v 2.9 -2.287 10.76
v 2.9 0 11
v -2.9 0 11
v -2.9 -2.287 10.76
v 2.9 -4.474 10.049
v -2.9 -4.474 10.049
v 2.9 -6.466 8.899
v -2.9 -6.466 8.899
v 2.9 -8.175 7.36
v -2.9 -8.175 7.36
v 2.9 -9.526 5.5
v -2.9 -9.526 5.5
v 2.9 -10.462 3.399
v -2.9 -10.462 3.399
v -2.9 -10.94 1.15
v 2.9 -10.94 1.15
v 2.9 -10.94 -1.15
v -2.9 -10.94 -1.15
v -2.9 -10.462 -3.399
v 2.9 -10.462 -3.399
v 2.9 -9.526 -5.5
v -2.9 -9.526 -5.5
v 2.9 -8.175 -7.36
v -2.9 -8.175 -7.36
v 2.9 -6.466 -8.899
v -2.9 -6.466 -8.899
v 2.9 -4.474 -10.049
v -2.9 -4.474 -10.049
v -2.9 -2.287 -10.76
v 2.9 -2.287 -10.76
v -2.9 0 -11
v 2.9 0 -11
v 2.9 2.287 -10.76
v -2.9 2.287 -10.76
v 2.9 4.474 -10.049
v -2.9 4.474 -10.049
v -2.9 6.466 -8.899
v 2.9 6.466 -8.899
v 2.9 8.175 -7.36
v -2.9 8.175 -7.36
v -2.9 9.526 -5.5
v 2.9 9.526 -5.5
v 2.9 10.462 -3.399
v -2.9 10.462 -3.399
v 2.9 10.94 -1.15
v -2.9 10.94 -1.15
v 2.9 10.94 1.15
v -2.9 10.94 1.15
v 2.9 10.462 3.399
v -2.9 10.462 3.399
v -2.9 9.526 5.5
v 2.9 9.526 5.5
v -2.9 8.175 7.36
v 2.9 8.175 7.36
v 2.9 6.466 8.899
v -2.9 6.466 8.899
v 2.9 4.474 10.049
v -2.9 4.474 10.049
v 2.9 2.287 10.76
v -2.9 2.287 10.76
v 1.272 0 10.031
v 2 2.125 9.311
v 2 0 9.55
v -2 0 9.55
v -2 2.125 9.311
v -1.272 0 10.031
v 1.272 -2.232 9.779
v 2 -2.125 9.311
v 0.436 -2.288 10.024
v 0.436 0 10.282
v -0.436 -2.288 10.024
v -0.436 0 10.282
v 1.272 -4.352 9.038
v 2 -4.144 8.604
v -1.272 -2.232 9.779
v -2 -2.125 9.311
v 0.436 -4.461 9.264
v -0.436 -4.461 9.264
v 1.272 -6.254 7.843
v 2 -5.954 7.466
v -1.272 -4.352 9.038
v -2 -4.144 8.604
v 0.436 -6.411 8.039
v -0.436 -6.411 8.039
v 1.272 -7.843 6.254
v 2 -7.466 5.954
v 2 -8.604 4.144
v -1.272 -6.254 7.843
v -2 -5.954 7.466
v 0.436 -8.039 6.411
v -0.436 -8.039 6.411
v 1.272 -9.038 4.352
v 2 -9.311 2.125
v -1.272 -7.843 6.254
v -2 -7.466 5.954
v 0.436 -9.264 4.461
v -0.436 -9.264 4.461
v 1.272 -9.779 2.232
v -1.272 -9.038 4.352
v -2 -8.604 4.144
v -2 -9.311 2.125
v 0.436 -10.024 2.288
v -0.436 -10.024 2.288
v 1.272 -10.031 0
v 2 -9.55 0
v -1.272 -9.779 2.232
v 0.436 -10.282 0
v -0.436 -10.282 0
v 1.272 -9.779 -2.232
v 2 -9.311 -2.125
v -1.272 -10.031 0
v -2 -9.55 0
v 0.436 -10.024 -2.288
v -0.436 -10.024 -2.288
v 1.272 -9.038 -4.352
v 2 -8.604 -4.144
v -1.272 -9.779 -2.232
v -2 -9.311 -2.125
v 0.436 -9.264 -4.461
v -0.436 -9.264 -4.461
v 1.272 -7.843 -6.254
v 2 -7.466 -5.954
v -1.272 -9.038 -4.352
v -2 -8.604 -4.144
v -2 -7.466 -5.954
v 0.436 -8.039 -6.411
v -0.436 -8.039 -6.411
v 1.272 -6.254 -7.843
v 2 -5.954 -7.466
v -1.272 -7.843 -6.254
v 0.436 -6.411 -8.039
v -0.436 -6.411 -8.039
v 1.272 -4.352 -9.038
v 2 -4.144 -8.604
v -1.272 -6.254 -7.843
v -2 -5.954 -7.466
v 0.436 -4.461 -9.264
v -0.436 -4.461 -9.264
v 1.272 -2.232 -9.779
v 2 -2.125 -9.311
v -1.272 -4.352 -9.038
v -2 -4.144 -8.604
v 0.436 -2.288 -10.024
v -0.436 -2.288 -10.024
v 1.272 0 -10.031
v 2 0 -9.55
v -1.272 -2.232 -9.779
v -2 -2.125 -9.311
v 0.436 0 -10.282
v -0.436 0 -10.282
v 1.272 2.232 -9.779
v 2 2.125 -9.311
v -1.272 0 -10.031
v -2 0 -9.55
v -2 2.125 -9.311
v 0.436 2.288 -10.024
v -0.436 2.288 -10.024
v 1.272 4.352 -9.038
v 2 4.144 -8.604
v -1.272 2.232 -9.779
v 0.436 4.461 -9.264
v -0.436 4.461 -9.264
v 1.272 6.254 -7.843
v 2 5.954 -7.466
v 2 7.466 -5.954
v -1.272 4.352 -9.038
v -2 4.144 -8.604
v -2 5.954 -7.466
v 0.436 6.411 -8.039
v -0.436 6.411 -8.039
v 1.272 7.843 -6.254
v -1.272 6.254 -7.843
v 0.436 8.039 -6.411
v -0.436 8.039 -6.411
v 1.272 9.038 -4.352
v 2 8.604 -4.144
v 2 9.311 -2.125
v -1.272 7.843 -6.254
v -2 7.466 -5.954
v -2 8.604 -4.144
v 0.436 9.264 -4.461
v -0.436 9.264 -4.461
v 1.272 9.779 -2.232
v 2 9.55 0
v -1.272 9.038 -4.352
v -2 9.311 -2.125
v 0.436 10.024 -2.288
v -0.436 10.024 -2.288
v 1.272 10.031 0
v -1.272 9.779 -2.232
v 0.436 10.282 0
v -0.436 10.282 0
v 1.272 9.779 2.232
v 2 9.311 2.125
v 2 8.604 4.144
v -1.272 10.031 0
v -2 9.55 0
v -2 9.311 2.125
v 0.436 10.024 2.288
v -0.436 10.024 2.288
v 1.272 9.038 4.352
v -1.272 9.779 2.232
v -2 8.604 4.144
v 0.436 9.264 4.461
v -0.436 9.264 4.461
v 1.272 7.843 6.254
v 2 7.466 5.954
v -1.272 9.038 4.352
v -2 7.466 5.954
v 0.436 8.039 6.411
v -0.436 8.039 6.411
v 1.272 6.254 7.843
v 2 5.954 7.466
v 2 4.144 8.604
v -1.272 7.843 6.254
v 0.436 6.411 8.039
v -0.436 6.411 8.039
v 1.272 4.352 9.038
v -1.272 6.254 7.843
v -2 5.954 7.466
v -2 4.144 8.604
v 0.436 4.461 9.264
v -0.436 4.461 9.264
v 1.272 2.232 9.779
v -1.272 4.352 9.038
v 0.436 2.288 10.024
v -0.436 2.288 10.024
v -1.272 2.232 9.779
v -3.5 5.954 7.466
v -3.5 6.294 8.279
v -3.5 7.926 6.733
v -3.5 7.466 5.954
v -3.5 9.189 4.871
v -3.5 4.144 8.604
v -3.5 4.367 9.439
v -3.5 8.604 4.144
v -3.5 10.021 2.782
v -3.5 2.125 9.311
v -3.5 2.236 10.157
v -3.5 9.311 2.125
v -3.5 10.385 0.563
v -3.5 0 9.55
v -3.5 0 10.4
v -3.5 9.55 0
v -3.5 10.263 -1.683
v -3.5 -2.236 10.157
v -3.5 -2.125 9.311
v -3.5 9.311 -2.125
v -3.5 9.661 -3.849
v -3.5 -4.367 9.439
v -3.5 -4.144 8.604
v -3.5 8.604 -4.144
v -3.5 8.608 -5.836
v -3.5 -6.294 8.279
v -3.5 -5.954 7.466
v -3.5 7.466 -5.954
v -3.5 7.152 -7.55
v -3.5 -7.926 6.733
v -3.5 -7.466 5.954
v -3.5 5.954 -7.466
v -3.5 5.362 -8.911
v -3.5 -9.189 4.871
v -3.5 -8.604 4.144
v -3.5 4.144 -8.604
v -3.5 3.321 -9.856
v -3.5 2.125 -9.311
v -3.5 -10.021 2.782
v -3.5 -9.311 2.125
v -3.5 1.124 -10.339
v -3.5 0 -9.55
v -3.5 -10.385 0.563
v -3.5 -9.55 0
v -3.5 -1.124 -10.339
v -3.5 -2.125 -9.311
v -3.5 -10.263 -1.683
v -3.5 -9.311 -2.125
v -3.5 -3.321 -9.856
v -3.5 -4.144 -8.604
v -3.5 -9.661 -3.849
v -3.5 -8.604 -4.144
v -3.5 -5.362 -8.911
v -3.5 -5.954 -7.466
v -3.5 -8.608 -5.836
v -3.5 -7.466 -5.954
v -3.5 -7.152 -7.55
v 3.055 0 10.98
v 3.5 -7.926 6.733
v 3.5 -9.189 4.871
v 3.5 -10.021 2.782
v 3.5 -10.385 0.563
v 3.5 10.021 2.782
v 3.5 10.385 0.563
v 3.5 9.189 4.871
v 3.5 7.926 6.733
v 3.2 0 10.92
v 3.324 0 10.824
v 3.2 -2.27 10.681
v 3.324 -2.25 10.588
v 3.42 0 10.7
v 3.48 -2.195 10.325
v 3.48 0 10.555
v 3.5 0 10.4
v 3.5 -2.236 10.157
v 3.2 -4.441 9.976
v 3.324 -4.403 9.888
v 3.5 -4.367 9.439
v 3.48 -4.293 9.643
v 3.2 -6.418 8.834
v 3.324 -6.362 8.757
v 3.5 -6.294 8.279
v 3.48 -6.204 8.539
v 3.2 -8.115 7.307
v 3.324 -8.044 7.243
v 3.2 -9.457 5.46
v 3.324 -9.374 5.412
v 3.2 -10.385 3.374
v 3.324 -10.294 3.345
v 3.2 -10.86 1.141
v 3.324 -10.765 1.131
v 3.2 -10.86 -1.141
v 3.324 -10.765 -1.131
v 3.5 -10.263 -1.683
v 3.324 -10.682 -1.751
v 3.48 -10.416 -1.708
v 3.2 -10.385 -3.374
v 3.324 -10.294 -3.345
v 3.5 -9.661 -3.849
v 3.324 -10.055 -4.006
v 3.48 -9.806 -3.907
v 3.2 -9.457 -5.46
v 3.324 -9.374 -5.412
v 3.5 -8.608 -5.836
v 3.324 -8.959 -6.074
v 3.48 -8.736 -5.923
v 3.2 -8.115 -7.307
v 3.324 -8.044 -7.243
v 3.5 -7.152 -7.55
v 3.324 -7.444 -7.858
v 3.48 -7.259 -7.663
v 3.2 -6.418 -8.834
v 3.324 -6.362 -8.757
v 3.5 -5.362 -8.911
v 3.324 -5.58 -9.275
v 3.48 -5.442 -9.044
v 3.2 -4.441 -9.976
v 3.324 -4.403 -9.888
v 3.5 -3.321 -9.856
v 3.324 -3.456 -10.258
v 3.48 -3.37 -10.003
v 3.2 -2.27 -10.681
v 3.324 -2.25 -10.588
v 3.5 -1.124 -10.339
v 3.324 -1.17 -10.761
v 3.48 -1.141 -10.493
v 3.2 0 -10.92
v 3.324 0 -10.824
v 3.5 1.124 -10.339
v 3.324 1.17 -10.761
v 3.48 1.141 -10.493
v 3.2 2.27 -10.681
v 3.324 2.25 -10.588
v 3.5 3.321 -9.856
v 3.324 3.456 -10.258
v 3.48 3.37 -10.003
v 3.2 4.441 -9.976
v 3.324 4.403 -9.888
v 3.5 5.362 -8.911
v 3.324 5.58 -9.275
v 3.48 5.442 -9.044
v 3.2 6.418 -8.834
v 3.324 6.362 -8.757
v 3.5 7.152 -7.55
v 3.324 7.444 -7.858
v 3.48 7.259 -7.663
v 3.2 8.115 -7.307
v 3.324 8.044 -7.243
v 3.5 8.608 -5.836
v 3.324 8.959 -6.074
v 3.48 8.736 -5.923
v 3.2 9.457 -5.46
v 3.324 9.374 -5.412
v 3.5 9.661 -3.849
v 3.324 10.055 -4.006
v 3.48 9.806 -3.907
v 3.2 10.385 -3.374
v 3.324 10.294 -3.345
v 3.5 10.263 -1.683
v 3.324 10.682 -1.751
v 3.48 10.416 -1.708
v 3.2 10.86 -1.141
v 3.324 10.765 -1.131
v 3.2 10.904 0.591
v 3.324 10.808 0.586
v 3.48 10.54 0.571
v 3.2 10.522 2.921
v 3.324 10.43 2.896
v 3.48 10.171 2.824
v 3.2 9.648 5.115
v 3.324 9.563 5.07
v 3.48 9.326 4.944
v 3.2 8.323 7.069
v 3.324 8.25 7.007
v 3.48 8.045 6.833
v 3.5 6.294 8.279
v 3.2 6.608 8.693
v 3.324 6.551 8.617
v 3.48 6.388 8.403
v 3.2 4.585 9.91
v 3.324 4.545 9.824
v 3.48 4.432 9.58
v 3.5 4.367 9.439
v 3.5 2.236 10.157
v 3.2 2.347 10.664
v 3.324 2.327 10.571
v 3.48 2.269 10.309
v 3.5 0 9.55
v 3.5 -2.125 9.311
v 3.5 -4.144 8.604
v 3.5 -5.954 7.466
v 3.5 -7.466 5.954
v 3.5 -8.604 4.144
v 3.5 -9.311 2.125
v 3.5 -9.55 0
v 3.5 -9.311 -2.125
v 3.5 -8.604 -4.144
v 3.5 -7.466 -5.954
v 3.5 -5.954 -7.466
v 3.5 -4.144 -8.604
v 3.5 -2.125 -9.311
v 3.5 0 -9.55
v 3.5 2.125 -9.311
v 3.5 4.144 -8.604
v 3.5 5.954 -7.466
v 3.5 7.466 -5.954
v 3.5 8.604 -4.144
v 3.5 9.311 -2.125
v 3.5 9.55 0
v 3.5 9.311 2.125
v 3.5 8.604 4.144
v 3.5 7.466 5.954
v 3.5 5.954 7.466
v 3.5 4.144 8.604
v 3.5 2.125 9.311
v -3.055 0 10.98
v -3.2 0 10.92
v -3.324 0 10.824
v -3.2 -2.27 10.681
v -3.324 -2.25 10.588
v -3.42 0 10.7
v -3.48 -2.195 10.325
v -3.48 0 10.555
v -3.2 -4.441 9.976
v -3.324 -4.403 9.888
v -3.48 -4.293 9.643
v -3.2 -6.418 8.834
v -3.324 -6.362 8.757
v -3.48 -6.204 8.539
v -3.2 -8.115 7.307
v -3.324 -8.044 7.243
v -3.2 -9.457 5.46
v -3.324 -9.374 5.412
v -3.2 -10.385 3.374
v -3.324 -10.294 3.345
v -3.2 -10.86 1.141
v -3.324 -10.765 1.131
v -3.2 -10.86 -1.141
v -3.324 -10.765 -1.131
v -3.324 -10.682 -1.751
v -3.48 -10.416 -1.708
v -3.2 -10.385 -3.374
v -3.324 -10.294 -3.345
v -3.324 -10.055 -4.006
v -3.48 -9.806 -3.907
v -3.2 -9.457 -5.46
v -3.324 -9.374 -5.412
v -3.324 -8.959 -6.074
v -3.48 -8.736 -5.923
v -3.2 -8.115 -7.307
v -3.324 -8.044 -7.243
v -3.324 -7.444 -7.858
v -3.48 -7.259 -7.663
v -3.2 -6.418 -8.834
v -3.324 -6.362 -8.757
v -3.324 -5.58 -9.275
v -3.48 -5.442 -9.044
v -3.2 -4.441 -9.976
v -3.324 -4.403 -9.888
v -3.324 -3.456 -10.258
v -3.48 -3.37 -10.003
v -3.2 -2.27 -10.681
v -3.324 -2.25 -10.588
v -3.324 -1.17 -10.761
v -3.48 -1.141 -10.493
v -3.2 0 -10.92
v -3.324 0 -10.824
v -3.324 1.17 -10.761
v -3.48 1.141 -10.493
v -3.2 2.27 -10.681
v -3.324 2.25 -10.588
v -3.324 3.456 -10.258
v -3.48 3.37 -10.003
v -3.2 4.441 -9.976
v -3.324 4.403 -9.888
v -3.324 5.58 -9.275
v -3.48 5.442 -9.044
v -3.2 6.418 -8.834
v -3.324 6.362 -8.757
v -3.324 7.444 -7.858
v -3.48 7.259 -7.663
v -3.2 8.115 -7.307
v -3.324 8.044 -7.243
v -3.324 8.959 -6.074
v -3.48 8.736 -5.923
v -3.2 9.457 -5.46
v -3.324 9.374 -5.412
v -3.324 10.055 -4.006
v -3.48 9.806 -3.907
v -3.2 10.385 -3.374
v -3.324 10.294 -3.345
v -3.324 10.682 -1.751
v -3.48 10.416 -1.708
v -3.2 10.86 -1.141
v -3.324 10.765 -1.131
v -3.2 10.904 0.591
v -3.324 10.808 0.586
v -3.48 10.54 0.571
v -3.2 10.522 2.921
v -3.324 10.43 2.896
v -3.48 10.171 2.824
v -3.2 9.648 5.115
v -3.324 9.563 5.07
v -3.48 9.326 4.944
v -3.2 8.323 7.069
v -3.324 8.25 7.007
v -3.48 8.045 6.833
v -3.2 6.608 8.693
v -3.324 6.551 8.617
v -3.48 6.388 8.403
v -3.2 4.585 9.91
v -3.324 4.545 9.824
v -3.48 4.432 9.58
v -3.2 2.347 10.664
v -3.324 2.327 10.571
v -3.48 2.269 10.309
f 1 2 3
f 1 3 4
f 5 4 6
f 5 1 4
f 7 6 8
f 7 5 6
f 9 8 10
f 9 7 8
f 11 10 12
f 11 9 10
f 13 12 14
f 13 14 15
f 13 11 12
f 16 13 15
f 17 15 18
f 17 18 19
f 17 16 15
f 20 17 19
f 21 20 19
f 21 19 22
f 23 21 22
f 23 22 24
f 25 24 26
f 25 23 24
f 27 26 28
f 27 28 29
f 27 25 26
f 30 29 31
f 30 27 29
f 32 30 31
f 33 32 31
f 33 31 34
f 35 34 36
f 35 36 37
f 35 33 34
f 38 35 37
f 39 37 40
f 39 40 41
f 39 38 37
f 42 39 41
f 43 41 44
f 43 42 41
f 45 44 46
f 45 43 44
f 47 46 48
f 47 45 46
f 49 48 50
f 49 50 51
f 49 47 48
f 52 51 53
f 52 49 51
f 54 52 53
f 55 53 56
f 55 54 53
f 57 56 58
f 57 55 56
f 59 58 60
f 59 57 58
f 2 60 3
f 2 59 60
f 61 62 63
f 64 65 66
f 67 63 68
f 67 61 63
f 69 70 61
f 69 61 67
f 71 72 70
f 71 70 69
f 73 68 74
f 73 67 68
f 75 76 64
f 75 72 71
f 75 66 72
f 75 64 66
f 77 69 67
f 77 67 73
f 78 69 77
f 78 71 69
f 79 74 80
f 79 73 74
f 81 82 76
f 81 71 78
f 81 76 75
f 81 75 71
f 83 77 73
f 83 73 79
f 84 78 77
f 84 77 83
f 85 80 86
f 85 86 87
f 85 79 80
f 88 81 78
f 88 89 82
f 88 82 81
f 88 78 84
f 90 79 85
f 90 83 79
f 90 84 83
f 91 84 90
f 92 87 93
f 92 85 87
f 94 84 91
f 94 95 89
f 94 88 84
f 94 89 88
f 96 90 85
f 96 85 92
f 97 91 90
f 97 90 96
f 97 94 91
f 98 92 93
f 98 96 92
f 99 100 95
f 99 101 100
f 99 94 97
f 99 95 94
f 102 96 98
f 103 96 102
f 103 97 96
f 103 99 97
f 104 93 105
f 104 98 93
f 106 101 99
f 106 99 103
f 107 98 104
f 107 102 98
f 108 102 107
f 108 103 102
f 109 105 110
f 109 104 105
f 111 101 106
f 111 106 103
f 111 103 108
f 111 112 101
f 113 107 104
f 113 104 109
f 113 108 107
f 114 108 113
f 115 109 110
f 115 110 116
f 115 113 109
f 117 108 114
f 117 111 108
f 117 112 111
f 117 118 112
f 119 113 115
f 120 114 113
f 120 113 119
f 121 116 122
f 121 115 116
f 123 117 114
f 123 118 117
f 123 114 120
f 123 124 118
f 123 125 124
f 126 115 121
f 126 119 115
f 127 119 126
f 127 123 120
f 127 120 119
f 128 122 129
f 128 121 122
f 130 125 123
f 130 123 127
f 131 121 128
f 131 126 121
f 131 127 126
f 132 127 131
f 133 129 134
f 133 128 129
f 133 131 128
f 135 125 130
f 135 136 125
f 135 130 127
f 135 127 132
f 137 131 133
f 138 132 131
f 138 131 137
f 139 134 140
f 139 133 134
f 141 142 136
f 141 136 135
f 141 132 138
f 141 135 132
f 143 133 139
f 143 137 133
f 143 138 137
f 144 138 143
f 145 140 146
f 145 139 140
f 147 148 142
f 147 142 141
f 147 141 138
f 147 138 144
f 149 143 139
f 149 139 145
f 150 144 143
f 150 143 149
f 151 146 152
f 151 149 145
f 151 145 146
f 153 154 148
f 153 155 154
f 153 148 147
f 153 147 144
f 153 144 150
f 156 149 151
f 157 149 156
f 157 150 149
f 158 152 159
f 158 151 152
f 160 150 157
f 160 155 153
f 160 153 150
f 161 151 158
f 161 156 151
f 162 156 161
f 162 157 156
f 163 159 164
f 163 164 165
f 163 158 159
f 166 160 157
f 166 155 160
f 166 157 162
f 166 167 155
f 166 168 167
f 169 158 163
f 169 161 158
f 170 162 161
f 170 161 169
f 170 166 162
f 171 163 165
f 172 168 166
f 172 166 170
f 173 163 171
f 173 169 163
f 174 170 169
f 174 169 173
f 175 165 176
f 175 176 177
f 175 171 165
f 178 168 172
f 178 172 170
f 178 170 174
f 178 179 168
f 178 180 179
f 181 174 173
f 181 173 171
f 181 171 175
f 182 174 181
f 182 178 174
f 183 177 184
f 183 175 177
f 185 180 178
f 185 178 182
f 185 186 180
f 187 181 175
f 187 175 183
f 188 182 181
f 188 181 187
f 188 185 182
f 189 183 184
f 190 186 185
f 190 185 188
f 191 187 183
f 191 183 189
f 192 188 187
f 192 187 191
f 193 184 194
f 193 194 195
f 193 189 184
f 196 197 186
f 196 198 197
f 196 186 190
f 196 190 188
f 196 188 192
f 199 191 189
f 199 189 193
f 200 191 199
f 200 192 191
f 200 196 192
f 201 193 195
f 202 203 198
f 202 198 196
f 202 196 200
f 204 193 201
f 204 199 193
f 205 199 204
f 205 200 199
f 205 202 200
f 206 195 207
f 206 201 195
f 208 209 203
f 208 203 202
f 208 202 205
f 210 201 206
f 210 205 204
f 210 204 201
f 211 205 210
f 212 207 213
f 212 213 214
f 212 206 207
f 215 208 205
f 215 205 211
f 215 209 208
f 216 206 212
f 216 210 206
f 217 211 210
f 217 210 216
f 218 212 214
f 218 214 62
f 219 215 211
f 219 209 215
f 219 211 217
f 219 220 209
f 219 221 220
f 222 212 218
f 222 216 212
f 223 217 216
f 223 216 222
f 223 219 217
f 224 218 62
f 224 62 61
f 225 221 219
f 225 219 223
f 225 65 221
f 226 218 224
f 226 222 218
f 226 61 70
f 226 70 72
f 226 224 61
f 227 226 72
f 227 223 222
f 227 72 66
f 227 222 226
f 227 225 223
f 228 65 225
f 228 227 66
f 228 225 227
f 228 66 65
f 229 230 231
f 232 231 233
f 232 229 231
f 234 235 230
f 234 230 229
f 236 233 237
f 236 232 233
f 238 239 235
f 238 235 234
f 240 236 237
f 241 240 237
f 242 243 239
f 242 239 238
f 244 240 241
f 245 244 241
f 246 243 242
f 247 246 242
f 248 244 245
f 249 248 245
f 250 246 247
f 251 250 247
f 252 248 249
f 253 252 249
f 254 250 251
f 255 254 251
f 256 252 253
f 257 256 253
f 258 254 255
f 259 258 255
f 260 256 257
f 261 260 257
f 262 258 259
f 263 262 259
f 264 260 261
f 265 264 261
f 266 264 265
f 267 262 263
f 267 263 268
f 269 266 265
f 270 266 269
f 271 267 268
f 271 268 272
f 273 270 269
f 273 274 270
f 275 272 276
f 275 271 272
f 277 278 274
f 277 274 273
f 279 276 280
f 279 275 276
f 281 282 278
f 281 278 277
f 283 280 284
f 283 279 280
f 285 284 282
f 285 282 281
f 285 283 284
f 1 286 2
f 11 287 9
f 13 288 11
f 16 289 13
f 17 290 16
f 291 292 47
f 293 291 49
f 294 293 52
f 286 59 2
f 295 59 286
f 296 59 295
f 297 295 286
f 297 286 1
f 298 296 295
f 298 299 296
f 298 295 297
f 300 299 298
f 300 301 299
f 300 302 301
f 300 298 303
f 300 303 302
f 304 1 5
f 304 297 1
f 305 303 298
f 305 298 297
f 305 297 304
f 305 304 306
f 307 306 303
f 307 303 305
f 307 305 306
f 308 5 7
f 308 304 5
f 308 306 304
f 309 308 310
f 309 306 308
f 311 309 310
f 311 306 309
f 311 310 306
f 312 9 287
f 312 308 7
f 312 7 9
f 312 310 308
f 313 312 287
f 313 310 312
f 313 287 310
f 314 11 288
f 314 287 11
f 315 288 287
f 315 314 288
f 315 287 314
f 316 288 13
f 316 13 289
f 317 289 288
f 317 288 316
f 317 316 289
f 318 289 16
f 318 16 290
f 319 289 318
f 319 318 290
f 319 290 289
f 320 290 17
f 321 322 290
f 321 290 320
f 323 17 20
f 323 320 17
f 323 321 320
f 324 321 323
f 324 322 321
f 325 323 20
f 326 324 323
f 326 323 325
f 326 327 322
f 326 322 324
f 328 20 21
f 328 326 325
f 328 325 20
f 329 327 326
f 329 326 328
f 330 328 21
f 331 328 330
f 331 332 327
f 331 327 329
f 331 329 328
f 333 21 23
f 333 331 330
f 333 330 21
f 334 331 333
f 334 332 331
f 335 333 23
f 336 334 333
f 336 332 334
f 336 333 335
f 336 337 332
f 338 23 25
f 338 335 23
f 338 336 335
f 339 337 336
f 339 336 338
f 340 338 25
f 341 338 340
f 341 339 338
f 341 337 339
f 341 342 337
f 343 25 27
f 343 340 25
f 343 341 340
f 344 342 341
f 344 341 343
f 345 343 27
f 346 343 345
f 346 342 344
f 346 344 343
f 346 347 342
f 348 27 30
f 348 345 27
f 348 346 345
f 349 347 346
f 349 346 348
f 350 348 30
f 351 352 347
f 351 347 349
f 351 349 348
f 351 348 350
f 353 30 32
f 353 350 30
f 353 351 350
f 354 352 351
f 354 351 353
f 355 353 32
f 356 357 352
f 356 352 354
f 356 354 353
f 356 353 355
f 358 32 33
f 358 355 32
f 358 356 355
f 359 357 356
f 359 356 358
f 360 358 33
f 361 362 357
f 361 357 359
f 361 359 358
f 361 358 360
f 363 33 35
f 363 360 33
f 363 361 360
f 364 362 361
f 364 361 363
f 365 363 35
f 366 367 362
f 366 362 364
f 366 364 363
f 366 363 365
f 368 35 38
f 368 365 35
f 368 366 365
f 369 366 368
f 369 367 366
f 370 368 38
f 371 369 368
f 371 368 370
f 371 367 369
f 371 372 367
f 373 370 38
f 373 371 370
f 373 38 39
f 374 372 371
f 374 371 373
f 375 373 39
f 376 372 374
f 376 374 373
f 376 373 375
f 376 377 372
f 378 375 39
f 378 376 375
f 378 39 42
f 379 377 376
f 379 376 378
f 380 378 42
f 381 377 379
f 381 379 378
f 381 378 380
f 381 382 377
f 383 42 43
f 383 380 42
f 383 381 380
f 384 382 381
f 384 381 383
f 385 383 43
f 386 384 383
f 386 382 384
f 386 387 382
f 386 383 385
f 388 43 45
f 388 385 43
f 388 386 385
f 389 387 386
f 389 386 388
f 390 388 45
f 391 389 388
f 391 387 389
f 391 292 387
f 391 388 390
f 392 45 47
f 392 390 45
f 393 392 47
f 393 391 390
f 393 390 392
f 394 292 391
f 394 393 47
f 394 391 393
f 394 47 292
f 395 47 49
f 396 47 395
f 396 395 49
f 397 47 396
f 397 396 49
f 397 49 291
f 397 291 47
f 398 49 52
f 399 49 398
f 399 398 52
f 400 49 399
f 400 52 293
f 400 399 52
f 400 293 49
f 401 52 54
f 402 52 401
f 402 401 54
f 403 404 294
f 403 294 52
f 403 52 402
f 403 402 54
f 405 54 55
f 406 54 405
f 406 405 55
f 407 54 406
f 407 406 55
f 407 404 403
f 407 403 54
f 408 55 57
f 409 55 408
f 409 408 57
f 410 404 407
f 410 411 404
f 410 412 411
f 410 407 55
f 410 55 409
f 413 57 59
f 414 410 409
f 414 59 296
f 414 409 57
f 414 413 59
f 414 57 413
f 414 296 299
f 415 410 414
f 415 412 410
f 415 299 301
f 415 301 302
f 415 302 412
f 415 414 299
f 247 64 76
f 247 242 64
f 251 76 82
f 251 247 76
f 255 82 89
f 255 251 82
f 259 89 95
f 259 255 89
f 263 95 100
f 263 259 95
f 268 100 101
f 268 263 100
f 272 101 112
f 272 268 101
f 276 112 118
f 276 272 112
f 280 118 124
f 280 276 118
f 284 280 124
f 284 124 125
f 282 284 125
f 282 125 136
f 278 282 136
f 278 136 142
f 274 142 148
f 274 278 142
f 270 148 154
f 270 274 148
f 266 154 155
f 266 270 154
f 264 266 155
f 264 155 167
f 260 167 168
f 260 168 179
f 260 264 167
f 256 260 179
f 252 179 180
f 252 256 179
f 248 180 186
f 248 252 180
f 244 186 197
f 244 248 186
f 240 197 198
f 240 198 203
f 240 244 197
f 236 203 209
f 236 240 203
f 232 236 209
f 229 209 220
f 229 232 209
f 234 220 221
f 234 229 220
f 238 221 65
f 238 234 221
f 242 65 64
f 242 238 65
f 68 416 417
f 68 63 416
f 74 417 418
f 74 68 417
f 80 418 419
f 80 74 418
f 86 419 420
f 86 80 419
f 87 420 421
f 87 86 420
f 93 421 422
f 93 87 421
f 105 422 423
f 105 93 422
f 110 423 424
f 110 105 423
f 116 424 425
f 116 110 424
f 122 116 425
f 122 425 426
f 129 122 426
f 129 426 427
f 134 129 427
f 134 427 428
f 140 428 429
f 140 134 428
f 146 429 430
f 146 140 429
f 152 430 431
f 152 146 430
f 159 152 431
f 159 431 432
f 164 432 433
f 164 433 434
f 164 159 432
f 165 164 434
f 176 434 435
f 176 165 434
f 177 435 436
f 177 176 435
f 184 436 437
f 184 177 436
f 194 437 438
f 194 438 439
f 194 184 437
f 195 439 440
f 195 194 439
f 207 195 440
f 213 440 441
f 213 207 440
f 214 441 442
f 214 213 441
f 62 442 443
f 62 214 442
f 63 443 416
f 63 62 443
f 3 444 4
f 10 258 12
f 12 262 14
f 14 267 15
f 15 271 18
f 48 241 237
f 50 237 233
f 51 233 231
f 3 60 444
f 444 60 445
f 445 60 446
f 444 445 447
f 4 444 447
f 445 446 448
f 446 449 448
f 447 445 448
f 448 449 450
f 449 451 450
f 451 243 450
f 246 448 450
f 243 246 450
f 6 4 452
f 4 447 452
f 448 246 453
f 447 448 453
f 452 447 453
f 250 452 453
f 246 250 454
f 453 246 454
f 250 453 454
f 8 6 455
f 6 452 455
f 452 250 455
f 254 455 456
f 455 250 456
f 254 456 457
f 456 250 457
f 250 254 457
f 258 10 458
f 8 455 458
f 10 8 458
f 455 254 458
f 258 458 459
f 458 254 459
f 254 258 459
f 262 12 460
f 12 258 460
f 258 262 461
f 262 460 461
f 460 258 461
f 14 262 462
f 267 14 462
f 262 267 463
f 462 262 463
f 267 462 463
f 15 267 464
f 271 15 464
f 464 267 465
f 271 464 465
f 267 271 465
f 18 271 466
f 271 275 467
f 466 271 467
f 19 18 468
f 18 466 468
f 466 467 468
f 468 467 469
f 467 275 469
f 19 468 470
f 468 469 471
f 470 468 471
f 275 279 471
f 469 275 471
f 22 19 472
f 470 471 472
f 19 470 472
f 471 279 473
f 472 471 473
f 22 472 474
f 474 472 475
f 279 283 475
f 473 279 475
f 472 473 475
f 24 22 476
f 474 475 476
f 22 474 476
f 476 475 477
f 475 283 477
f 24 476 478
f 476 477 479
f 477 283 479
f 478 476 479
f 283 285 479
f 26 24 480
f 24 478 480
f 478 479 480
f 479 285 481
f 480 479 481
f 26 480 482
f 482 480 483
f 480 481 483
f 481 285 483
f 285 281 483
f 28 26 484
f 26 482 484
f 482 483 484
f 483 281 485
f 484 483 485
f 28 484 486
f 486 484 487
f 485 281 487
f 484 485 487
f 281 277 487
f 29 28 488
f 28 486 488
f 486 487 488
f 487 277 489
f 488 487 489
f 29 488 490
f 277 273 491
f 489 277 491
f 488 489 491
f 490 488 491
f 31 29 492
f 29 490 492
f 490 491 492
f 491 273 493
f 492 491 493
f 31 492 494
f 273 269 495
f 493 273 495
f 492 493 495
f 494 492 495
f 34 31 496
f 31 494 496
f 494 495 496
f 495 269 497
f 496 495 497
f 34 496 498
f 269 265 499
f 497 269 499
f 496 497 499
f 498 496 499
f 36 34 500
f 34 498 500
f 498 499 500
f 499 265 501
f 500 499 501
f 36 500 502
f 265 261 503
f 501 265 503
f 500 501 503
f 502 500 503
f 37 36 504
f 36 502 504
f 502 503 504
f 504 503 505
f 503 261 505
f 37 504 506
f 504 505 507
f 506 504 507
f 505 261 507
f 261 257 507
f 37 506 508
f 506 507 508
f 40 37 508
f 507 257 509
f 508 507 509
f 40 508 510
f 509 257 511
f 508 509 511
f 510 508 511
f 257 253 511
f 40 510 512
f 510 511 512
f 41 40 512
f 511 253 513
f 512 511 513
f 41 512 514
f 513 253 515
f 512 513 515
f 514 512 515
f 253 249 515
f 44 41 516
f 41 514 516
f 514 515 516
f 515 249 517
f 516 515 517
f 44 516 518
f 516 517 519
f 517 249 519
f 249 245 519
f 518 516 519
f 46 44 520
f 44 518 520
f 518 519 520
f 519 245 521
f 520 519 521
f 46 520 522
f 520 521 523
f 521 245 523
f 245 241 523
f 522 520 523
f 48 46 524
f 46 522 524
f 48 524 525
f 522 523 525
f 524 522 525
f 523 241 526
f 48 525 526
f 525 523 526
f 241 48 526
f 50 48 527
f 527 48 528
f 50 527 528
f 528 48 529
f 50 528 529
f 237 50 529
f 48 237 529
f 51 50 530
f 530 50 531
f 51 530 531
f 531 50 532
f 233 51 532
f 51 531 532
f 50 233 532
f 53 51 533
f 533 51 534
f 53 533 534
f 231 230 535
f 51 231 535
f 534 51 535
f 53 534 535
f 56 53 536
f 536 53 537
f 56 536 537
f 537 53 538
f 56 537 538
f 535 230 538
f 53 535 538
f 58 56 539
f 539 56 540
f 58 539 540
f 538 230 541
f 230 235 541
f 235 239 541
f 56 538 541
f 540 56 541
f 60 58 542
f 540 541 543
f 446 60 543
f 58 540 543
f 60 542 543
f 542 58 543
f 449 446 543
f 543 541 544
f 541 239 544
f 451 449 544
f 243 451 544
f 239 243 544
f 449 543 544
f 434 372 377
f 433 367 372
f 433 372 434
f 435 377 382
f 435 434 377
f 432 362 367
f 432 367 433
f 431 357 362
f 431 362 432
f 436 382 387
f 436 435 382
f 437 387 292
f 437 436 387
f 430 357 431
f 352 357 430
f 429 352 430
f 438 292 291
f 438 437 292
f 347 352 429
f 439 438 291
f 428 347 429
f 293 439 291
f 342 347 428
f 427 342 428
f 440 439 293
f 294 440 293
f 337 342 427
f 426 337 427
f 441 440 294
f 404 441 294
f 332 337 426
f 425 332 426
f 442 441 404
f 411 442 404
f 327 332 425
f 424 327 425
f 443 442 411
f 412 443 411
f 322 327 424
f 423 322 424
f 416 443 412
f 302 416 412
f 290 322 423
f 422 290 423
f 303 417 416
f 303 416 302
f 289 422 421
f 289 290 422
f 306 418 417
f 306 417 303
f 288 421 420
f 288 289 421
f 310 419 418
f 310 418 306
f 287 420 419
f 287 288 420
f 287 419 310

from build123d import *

# Parameters (mm, degrees)
RADYUS1_R = 0.6


with BuildPart() as part:
    # Çizim1 → Döndür1 (revolve)
    with BuildSketch(Plane.XY, mode=Mode.PRIVATE) as d_nd_r1_sk:
        with BuildLine():
            Line((-3.5, 11), (3.5, 11))
            Line((3.5, 11), (3.5, 9.55))
            Line((3.5, 9.55), (2, 9.55))
            ThreePointArc((2, 9.55), (0, 10.313932023), (-2, 9.55))
            Line((-2, 9.55), (-3.5, 9.55))
            Line((-3.5, 9.55), (-3.5, 11))
        make_face()
    revolve(d_nd_r1_sk.sketch.rotate(Axis((-13.551089688, 0, 0), (1, 0, 0)), 90), axis=Axis((-13.551089688, 0, 0), (1, 0, 0)))

    # Radyus1
    radyus1_edges = [part.edges().sort_by_distance(p)[0] for p in [
        (3.5, 0, -11),
        (-3.5, 0, -11),
    ]]
    fillet(radyus1_edges, radius=RADYUS1_R)


solid = part.part
